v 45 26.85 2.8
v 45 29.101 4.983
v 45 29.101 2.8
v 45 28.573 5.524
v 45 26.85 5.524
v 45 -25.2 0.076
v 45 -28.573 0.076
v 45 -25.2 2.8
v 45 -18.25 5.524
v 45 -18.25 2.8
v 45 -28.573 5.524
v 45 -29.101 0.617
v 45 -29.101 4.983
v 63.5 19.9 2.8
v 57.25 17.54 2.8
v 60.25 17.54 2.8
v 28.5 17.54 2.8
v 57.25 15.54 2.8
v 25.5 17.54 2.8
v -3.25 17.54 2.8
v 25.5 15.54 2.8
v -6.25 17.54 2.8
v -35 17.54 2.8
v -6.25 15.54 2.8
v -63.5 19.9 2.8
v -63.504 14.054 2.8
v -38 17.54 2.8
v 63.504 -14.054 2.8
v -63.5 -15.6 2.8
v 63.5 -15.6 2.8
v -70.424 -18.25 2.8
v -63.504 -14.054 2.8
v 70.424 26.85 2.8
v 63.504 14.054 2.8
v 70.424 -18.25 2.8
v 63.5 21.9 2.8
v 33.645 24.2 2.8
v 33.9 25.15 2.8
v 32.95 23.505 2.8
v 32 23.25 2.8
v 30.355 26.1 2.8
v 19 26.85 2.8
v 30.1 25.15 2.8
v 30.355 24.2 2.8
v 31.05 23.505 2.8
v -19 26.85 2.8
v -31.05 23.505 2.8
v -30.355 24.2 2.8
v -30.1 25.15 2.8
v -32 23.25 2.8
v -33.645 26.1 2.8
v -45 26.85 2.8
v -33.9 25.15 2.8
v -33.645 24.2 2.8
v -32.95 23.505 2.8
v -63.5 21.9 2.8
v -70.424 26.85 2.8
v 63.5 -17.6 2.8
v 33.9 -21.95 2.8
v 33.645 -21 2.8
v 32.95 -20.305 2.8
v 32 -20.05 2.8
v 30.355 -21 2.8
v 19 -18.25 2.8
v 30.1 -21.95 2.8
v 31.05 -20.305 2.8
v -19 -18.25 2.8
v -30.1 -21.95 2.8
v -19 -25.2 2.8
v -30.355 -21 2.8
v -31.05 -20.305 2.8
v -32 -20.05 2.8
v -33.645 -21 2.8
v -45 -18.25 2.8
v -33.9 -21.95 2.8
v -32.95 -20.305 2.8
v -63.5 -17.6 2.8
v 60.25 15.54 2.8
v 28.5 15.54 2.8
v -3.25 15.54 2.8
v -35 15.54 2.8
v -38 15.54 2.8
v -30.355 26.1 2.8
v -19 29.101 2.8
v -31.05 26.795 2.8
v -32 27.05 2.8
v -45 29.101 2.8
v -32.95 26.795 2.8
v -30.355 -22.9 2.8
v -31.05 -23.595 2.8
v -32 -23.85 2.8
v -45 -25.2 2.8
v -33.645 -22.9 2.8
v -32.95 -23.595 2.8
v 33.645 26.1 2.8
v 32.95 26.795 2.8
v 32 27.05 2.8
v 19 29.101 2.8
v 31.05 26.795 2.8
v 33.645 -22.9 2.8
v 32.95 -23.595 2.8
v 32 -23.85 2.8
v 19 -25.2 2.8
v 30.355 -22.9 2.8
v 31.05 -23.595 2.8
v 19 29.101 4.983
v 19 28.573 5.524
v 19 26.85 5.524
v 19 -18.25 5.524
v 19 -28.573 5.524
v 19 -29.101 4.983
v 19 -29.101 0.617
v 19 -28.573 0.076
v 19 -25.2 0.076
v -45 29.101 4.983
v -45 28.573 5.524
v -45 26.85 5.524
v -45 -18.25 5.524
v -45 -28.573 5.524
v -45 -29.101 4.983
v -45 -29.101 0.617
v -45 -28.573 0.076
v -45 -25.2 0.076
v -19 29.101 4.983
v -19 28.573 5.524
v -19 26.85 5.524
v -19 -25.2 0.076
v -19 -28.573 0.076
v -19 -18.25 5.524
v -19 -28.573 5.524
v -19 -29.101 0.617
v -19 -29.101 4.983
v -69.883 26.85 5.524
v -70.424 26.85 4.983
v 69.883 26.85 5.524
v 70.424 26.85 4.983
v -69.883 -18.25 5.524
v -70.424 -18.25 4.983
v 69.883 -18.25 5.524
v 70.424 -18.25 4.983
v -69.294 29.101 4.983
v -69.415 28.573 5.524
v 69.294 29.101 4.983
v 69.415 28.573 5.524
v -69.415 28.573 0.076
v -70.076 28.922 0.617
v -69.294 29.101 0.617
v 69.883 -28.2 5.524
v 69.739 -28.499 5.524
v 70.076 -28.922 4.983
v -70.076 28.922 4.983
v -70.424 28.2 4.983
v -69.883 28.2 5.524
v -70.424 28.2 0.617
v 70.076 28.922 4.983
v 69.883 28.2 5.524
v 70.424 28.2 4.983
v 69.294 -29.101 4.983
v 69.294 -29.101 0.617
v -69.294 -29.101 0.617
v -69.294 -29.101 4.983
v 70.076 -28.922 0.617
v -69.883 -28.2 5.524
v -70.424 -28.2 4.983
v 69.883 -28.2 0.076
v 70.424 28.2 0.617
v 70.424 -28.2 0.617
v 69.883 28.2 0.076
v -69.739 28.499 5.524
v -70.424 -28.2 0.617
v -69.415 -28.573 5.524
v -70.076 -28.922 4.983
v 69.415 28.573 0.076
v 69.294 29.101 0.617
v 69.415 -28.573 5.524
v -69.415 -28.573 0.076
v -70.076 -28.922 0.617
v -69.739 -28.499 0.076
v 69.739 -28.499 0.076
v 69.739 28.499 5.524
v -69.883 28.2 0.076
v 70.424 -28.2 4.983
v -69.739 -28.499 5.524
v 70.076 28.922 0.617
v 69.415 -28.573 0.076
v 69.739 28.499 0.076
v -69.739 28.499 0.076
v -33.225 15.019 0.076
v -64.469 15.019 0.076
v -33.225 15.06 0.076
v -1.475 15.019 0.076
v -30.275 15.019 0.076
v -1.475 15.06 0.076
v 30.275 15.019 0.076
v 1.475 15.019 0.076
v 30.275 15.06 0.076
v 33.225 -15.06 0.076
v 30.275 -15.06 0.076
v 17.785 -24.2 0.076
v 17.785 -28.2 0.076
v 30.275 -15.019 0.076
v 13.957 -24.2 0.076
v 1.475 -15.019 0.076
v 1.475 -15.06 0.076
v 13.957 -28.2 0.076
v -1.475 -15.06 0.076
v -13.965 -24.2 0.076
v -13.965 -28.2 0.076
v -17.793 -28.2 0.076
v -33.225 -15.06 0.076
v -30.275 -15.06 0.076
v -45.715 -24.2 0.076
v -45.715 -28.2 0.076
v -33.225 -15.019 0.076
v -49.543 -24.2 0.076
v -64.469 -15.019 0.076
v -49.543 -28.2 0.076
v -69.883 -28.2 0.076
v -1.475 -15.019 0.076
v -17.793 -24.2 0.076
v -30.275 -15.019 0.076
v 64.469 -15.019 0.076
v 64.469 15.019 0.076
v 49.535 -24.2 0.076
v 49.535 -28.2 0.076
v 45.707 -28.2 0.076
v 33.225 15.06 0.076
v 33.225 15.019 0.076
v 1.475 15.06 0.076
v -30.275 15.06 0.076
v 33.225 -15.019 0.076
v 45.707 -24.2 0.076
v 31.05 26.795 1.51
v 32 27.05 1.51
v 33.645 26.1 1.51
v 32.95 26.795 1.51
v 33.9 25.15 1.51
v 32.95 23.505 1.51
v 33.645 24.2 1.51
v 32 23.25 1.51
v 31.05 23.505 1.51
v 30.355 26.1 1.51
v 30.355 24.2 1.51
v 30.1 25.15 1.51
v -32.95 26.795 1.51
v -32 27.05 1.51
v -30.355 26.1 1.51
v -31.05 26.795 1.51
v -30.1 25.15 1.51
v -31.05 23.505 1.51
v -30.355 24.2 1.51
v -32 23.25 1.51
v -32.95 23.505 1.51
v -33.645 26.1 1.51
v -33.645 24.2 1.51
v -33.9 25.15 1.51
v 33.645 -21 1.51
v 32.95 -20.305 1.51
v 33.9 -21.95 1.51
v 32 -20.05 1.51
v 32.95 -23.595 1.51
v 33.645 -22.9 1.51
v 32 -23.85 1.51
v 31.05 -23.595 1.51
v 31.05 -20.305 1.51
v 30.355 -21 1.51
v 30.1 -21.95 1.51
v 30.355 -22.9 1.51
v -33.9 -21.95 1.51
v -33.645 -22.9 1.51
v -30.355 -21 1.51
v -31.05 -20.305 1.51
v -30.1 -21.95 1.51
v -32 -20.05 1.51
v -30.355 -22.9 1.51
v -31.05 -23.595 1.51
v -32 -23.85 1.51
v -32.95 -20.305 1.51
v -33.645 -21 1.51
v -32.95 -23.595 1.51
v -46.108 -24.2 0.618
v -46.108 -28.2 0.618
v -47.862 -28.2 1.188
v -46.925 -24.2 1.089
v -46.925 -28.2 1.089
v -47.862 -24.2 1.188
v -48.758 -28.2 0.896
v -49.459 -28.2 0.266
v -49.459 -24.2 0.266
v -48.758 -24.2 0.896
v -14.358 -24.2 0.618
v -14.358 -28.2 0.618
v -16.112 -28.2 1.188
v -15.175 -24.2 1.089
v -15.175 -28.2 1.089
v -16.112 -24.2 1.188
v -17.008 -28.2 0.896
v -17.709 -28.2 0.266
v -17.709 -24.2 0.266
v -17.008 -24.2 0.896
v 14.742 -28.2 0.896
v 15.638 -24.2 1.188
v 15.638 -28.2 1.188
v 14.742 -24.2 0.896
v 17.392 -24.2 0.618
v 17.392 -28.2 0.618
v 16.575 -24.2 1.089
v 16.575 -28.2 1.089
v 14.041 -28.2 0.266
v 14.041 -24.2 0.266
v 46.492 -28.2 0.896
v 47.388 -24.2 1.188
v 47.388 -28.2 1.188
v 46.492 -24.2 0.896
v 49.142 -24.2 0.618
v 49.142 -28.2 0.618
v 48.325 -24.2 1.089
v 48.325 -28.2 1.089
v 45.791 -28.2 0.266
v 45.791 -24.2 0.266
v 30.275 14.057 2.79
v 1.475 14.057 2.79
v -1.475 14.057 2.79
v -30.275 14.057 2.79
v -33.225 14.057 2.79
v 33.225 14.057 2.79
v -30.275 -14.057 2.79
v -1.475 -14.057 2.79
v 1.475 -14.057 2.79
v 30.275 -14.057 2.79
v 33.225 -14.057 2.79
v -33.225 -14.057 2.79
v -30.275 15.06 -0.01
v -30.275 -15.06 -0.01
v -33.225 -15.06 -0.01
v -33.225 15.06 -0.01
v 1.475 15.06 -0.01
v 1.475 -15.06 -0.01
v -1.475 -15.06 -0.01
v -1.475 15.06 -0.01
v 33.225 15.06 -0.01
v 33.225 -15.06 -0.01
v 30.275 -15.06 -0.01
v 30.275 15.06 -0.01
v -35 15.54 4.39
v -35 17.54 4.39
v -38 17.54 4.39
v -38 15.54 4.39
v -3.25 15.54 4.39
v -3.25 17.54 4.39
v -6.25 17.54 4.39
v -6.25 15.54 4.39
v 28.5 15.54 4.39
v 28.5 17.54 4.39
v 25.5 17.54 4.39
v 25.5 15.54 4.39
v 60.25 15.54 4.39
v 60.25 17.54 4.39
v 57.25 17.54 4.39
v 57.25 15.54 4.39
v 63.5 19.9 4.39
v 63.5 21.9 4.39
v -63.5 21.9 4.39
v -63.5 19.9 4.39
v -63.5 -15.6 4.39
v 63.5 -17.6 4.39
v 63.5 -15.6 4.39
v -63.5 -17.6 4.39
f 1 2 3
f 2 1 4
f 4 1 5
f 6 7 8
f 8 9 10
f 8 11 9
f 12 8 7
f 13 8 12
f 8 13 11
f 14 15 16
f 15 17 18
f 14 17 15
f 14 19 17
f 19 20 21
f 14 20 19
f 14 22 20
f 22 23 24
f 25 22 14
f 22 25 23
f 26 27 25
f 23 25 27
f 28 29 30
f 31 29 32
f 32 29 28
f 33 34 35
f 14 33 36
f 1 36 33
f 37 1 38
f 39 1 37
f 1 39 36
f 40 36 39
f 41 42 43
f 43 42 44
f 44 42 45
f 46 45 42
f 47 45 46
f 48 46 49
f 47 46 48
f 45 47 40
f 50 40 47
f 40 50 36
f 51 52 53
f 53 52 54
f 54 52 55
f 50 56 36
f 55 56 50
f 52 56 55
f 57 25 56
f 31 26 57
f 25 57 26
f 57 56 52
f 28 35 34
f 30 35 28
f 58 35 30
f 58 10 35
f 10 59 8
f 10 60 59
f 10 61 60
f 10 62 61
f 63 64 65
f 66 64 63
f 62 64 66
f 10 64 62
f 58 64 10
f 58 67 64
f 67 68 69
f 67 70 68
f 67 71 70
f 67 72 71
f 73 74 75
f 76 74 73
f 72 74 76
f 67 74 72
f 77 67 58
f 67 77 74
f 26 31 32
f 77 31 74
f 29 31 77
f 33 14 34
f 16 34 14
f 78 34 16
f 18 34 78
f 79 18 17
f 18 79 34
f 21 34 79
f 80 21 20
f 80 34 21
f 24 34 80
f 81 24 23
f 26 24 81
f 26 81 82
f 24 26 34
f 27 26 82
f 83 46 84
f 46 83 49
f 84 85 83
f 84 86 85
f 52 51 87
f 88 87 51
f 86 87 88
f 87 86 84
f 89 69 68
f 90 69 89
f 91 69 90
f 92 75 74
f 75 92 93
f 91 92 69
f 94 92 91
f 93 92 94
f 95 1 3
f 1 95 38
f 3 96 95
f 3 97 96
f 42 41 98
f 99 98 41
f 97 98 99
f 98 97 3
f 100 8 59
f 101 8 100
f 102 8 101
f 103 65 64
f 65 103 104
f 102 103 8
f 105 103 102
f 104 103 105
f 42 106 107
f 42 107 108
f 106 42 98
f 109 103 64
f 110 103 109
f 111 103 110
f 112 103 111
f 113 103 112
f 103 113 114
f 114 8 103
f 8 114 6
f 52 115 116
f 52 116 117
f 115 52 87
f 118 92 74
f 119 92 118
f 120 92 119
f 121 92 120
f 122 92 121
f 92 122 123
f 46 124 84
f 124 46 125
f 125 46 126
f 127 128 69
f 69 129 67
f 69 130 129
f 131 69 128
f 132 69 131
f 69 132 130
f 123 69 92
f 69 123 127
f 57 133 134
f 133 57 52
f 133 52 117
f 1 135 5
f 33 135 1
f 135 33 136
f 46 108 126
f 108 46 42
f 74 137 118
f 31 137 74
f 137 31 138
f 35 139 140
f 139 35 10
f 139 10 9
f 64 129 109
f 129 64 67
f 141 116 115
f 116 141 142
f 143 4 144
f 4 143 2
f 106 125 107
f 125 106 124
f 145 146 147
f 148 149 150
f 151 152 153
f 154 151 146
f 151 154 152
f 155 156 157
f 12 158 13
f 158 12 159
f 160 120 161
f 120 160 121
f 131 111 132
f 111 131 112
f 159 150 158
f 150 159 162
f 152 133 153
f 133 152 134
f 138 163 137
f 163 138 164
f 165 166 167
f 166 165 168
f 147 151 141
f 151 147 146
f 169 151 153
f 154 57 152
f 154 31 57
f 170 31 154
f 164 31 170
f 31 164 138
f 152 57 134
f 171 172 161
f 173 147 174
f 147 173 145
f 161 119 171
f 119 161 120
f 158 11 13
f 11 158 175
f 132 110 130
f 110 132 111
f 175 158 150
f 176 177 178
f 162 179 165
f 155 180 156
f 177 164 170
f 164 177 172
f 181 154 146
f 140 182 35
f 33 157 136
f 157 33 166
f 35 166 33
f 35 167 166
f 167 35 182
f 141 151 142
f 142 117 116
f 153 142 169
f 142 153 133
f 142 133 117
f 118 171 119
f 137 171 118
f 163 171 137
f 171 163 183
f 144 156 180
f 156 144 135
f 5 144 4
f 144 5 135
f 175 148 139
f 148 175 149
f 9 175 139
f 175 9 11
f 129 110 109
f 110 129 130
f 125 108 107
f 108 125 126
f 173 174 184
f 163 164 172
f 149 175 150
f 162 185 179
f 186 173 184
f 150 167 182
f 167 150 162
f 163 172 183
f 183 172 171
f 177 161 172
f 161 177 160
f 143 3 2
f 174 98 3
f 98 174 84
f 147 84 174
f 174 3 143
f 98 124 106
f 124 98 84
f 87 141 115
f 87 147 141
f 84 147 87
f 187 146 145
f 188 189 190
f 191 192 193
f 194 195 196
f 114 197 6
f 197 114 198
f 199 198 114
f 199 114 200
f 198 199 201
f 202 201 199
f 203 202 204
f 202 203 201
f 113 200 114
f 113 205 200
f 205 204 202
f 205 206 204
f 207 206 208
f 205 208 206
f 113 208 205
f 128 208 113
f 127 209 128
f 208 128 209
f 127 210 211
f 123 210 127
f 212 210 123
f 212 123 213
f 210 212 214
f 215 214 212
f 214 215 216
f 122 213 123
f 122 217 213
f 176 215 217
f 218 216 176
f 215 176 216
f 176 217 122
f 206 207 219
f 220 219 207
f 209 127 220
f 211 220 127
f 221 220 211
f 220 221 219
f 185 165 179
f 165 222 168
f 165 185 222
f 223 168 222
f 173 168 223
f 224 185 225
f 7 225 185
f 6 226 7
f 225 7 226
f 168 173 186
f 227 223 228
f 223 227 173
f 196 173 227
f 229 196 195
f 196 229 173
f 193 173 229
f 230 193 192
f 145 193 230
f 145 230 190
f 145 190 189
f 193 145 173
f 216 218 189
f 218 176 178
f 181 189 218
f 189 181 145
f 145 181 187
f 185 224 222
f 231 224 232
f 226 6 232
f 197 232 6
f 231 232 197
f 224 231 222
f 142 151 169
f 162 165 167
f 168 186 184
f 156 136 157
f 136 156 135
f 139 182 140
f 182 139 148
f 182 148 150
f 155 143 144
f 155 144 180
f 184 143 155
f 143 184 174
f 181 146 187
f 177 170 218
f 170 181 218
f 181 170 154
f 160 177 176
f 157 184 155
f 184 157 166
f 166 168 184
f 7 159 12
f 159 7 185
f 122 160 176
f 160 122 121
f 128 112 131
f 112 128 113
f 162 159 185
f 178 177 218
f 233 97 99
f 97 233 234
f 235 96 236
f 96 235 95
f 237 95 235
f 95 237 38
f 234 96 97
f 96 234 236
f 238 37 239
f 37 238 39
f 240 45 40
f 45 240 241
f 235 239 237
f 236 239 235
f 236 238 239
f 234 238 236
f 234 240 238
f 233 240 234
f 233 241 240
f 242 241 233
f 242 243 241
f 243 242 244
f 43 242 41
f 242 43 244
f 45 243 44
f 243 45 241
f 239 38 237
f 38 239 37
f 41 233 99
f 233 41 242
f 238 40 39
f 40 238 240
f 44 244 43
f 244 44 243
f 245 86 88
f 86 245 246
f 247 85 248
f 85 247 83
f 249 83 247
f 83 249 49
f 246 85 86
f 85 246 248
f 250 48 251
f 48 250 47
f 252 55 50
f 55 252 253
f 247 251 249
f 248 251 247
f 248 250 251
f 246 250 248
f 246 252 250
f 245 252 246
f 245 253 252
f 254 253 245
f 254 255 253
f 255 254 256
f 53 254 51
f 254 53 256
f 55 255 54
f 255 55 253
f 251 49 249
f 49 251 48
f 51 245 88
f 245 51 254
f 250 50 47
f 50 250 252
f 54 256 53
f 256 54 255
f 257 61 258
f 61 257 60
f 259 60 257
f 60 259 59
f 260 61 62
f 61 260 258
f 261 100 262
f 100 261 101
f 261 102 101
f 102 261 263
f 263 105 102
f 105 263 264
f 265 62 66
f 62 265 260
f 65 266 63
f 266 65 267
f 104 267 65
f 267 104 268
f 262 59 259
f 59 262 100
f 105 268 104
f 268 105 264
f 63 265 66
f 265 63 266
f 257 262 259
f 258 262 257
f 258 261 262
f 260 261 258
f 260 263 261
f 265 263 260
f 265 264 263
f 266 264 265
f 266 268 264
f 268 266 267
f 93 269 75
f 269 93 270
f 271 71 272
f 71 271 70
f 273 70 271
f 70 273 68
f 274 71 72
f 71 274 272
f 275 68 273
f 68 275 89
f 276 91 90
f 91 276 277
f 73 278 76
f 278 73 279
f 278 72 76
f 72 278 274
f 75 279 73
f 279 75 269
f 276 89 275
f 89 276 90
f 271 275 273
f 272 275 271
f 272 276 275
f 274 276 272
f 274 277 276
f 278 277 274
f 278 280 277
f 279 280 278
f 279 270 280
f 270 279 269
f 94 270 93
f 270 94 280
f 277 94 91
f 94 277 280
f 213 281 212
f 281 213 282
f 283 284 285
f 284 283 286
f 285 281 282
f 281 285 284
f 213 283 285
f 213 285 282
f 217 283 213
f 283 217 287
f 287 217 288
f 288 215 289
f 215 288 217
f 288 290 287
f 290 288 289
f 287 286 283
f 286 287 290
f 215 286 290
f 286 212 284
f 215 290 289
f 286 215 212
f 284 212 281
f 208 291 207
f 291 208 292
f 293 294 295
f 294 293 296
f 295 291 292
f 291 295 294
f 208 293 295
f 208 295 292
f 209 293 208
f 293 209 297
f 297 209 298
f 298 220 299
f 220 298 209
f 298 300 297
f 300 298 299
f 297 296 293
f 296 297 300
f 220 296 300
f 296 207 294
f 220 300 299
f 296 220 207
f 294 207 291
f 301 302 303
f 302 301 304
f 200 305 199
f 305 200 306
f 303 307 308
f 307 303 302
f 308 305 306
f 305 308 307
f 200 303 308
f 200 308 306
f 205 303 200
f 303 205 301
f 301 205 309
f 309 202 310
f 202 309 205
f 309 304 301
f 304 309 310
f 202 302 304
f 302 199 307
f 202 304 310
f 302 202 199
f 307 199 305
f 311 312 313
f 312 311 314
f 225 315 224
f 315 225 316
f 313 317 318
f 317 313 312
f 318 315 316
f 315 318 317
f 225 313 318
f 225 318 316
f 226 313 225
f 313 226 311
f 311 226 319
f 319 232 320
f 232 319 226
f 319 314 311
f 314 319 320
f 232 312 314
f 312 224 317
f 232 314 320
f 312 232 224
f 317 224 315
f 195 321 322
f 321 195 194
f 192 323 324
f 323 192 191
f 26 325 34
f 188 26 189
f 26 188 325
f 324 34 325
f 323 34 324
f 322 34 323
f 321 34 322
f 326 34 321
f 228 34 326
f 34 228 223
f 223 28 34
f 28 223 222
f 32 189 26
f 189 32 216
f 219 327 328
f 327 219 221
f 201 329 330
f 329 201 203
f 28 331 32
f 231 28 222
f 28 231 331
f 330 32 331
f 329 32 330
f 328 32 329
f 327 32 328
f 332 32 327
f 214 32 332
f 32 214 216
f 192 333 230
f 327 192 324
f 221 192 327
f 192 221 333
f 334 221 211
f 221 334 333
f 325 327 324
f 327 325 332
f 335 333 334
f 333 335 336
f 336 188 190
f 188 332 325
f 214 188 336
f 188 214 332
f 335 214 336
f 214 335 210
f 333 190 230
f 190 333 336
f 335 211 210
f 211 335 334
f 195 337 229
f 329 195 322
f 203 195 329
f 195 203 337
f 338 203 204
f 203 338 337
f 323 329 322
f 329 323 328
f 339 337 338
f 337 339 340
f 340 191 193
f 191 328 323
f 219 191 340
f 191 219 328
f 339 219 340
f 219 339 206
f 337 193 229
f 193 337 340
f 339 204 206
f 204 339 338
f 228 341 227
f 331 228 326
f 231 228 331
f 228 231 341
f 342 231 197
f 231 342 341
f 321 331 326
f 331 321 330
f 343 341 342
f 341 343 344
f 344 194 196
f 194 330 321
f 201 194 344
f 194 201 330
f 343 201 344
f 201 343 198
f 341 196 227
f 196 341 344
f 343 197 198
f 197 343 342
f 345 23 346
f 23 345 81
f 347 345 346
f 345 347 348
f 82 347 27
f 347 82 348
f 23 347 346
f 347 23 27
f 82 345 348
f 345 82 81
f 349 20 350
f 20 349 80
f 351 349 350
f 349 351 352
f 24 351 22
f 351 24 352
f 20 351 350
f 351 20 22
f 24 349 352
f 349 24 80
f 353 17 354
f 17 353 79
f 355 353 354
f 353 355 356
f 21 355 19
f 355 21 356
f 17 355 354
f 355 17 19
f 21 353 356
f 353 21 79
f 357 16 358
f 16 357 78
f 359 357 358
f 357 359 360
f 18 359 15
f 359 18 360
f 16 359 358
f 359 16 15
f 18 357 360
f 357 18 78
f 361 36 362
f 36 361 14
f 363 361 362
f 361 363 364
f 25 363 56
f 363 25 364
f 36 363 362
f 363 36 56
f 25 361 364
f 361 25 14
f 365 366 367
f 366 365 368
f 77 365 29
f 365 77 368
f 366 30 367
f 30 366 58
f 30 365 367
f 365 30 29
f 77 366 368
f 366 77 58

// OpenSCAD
// -*- mode: SCAD ; c-file-style: "ellemtel" ; coding: utf-8 -*-
//
// Holder to scan Minox film strips with a Reflecta ProScan 10T
//
// © 2018 Roland Sieker <ospalh@gmail.com>
// Licence: CC-BY-SA 4.0


/* [Global] */


// … to preview. You will get both parts when you click “Create Thing”.
part = "halter"; // [halter: film holder, einsatz: film holder clamp]

// Set this to “render” and click on “Create Thing” when done with the setup.
preview = 1; // [0:render, 1:preview]

/* [Holder] */

// Width of the holder. This one and the next one are the two values you do need to set up for your scanner. Preset is for a Reflecta proScan. Maybe subtract half a millimtre for a better fit.
holder_width = 58.4;  // [20:0.1:150]

// Height or thickness of the holder. See above. You know they were too high when you need a mallet to go from one image to the next…
holder_thickness = 5.6;  // [3:0.1:10]

// How many exposures on the longest strips you want to fit into this. Make sure the resulting holder still fits onto your print bed.
images_per_strip = 4;  // [1:1:8]

// Different manufacturers’ scanner place their little catches to position the holder at different sides.
position_notch_side = 90;  // [90: bottom, 0: side]

/* [Magnets] */

// Diameter of the magnet hole. Add clearance by hand here. Set to 0 for no magnet holes.
magnet_diameter = 3.8;  // [0:0.1:15]
// Height or thickness of the magnet. Make sure to use magnets flat enough to fit.
magnet_height = 1;  // [0.5:0.1:3]

/* [Hidden] */

// Das ganze Filmgrößen-Geraffel wieder verstecken: ein thing pro
// Film. Teil der Automatik (mit/ohne Stege, Lang-oder Kurzkerbe) sind so
// halbwegs inaktiv.


// Width of the film
film_width = 35;  // [8:0.1:70]
// Length from the left edge of an exposure to its right edge
image_width = 28.8; // [8:0.1:100]
image_pitch = 127/4;  // Ein Viererstreifen ist genau 127 mm lang. Das ist
// irgendwie was rundes in Zöllen. Das muss mich nicht scheren.

// Size of an exposure from bottom to top.
image_height = 28.1; // Hat sich was, »quadratishc«. Nachmessen hat ergeben, dass die Bilder etwas breiter als hoch sind.
rand_unten = 5.6;  // Könnten 7/32 Zoll sein. What TF ever. Ich könnte 118 Schweizerfranken bezahlen und es im Standard nachlesen. Oder das Geld sparen
rand_oben = film_width - image_height - rand_unten;
echo("rand_oben", rand_oben);

bildabstand = max(image_pitch, image_width);
l_filmsteg = max(0, bildabstand-image_width);
r_r = 1.0;  // Rundungsradius

// Auch wichtig:
l_zk = 4;  // Länge Zentrierkerbe
b_zk = 4;  // Breite Zentrierkerbe
h_zk = 1.2;  // Tiefe der Zentrierkerbe
w_zk = 1;  // Wand bzw Abstand der Zentrierkerbe vom Rand



l_griff = 25;
o_griff = 26;
w_griff = 2;


w_schraeg = 1;  // Breite der Abschrägung rund um die Filmfenster

kurzsteg_grenze = w_schraeg;  // Weniger als 1 mm pro Seite: Kurzstege

mit_langsteg_oben = ( rand_oben >= kurzsteg_grenze);
mit_langsteg_unten = ( rand_unten >= kurzsteg_grenze);


w_steg = 2;  // Breite für Stücke, die den Film zentrieren.
l_kurzsteg = 0.4*bildabstand;  // Länge für Stücke, die den Film zentrieren,
// wenn wir keine Fensterstege machen


magnet_off_oben = -2;
magnet_off_unten = 1.2;

w_filmloch = 2.5; // Ein zehntel Zoll?
l_filmloch = 3.5; // ca. 35/254 Zoll.
// dy_fl_bl = 1.25; // Abstand Filmloch oben zum Blidbereich
dy_fl_k = 1.86;  // Abstand Filmloch unten zur Filmkante
dx_fl_sm = 3;  // Abstand Filmloch links zur Mitte des Stegs

// *******************************************************
// Extra parameters. These can be changed reasonably safely.


w = 1.8;  // Wall width
p = 1.2;  // Bottom, top plate height
c = 0.5;  // Clearance
c_z = 0.3;  // Clearance in z direction. Mostly for the magnet hole and centering ridge
angle = 60; // Overhangs much below 60° are a problem for me


// Halbwegs wichtig
h_steg = 1.6;  // Höhe für Stücke, die den Film zentrieren.
h_nut = h_steg + c_z;  // Tiefe für Stücke, auf denen der Film nicht aufliegt



// *******************************************************
// Some shortcuts. These shouldn’t be changed

tau = 2 * PI;  // π is still wrong. τ = ⌀ ÷ r

xy_factor = 1/tan(angle);
// To get from a height to a horizontal width inclined correctly
z_factor = tan(angle);  // The other way around

some_distance = 1.2 * holder_width;
ms = 0.01;  // Muggeseggele.

// fn for differently sized objects and fs, fa; all for preview or rendering.
pna = 40;
pnb = 15;
pa = 5;
ps = 1;
rna = 180;
rnb = 30;
ra = 1;
rs = 0.1;
function na() = (preview) ? pna : rna;
function nb() = (preview) ? pnb : rnb;
$fs = (preview) ? ps : rs;
$fa = (preview) ? pa : ra;

l_fenster = bildabstand * images_per_strip;
l_rand = 2 * w_steg + w_schraeg + 2;
w_rand = w_schraeg + 7;
l_ue_a =  l_fenster + 2*l_rand;
w_einsatz = image_height + 2 * w_rand;
h_bd = holder_thickness/2;  // Höhe Boden oder Deckel

to_griff = l_ue_a/2 - o_griff - l_griff/2;



// *******************************************************
// End setup




// *******************************************************
// Generate the parts


print_part();
// filmhalter();
// einsatz();
// preview_parts();
// stack_parts();



module print_part()
{
   if ("halter" == part)
   {
      filmhalter();
   }
   if ("einsatz" == part)
   {
      einsatz();
   }
}

module preview_parts()
{
   filmhalter();
   translate([0, some_distance, 0])
   {
      einsatz();
   }
}

module stack_parts()
{
   // intersection()
   {
       // color("yellow")
      {
         filmhalter();
      }
      translate([0,0,holder_thickness + ms])
      {
         rotate([0,180,0])
         {
            // color("red")
            {
               einsatz();
            }
         }
      }
   }
}

// *******************************************************
// Code for the parts themselves


module filmhalter()
{
   difference()
   {
      basis_filmhalter();
      fenster();
      magnetausschnitte();
      kerben(false);
   }
   fensterstege();
   bodenstege();
}

module einsatz()
{
   difference()
   {
      union()
      {
         difference()
         {
            basis_einsatz();
            fenster();
         }
         fensterstege();
      }
      einsatzausschnitte();
      // magnetausschnitte(magnet_diameter/2);
      magnetausschnitte();
      kerben(true);
   }

}


module basis_filmhalter()
{
   translate([0,0,h_bd])
   {
      difference()
      {
         massiver_halter();
         einsatz_ausschnitt(2*c);
      }
   }
}


module basis_einsatz()
{
   translate([0,0,h_bd])
   {
      intersection()
      {
         massiver_halter();
         rotate([0,180,0])
         {
            einsatz_ausschnitt(0);
         }
      }
   }

}

module massiver_halter()
{
   hull()
   {
      vosp();
      mirror([0,0,1])
      {
         vosp();
      }
   }

   module vosp()
   {
      tosp();
      mirror([0,1,0])
      {
         tosp();
      }
   }
   module tosp()
   {
      osp();
      mirror([1,0,0])
      {
         osp();
      }

   }

   module osp()
   {
      translate([l_ue_a/2-r_r, holder_width/2-r_r, holder_thickness/2-r_r])
      {
         sphere(r=r_r);
      }
   }
}


module einsatz_ausschnitt(ec)
{
   translate([0, 0, holder_thickness])
   {
      translate([0, rand_unten - rand_oben, 0])
      cube([l_ue_a+2*ms, w_einsatz + ec, 2*holder_thickness], center=true);
      grip_cut();
      mirror()
      {
         grip_cut();
      }
   }
   module grip_cut()
   {
      translate([to_griff, 0, 0])
      {
         cube([l_griff + ec, holder_width + 2*ms, 2*holder_thickness], center=true);
         translate([0, -holder_width/2, 0])
         {
            cube([l_griff + ec, 2*w_griff+4*ec, 4*holder_thickness], center=true);
         }
      }
   }
}

module fenster()
{
   translate([0, 0, h_bd])
   {
      hull()
      {
         translate([0,0,-0.5+ms])
         {
            cube([l_fenster, image_height, 1], center=true);
         }
         translate([0,0,-h_bd-0.5-ms])
         {
            cube(
               [l_fenster+2*w_schraeg, image_height+2*w_schraeg, 1], center=true);
         }
      }

   }
}


module magnetausschnitte()
{
   if (magnet_diameter > 0 && magnet_height > 0)
   {
      yo_mag = w_einsatz/2 + magnet_diameter/2;
      magnetausschnitt(to_griff, yo_mag + magnet_off_unten);
      magnetausschnitt(-to_griff, yo_mag + magnet_off_unten);
      magnetausschnitt(to_griff, -yo_mag - magnet_off_oben);
      magnetausschnitt(-to_griff, -yo_mag - magnet_off_oben);
   }
}

module magnetausschnitt(exo, eyo)
{


   // Mittig in den Griffen.
   translate(
      [exo, eyo, h_bd - magnet_height-c_z + ms])
   {
      cylinder(d=magnet_diameter, h=magnet_height+c_z);
      // N.B. Spiel ist schon im magnet_diameter eingerechnet
   }
}

module bodenstege()
{
   translate([0, 0, -ms+h_steg/2+h_bd])
   {
      if (mit_langsteg_unten)
      {
         langbodensteg(rand_unten);
      }
      else
      {
         kurzbodenstege(rand_unten);
      }
      if (mit_langsteg_oben)
      {
         rotate(180)
         {
            langbodensteg(rand_oben);
         }
      }
      else
      {
         rotate(180)
         {
            kurzbodenstege(rand_oben);
         }
      }
      zentriernasen();
   }
   module langbodensteg(eo)
   {
      translate([0,w_steg/2+image_height/2+c/2+eo, 0])
      {
         cube([l_fenster, w_steg, h_steg], center=true);
      }
   }
   module kurzbodenstege(eo)
   {
      for (i=[0:images_per_strip-1])
      {
         translate([-l_fenster/2 + (0.5 + i) * bildabstand, w_steg/2+image_height/2+eo+c/2, 0])
         {
            cube([l_kurzsteg, w_steg, h_steg], center=true);
         }
      }
   }
   module zentriernasen()
   {
      for (i=[1:images_per_strip])
      {
         // Irgendwie ist »oben« und »unten« verkehrt. Für Teile unten braucht mensch positive y-Werte.
         translate(
            [-l_fenster/2 + i * bildabstand-l_filmloch+c/2-dx_fl_sm,
             +image_height/2 + rand_unten - w_filmloch -dy_fl_k+ c/2 , -h_steg/2])
         {
            cube([l_filmloch-c, w_filmloch-c, h_steg]);
         }
      }
   }
}

module einsatzausschnitte()
{
   translate([0, 0, h_bd + ms-h_nut/2])
   {
      if (mit_langsteg_unten)
      {
         langausschnitt(rand_unten);
      }
      else
      {
         kurzausschnitte(rand_unten);
      }
      if (mit_langsteg_oben)
      {
         rotate(180)
         {
            langausschnitt(rand_oben);
         }
      }
      else
      {
         rotate(180)
         {
            kurzausschnitte(rand_oben);
         }
      }
      zentrierausschnitte();
   }
   module langausschnitt(eyo)
   {
      translate([0,w_steg/2+image_height/2+eyo+c/2,0])
      {
         cube([l_fenster+6*c, w_steg+2*c, h_nut], center=true);
      }
   }
   module kurzausschnitte(eyo)
   {
      for (i=[0:images_per_strip-1])
      {
         translate(
            [-l_fenster/2 + (0.5 + i) * bildabstand,
             w_steg/2+image_height/2+eyo+c/2-film_width/4 + image_height/4, 0])
         {
            cube(
               [l_kurzsteg+2*c, w_steg+2*c+film_width/2 - image_height/2,
                h_nut], center=true);
         }
      }
   }
      module zentrierausschnitte()
   {
      for (i=[0:images_per_strip-1])
      {
         translate(
            [-l_fenster/2 + i * bildabstand-c/2+dx_fl_sm,
             +image_height/2 + rand_unten - w_filmloch -dy_fl_k- c/2 , -h_nut/2])
         {
            cube([l_filmloch+c, w_filmloch+c, h_nut]);
         }
      }
   }
}


module fensterstege()
{
   if (l_filmsteg > 0)
   {
      for (i=[1:images_per_strip-1])
      {
         translate([-l_fenster/2 + i * bildabstand, 0, h_bd/2-ms])
         {
            cube([l_filmsteg, image_height+2*w_schraeg + 2*ms ,h_bd], center=true);
         }
      }
   }
}

module kerben(oben)
{
   // Den Radius der Zentrierkerbe kann mensch per Pythagoras bestimmen.
   // Hypothenuse = r_zk
   // 1. Kathete = l_zk/2
   // 2. Kathete = r_zk - h_zk
   // h_zk > 0
   // r_zk * r_zk = l_zk * l_zk / 4 + r_zk * r_zk - 2 * r_zk * h_zk + h_zk * h_zk
   // 0 = l_zk * l_zk / 4 - 2 * r_zk * h_zk + h_zk * h_zk
   // 2 * r_zk * h_zk =
   r_zk = (l_zk * l_zk / 4 + h_zk * h_zk) / (2 * h_zk);
   // Die Variable heißt »position_notch_side«, und enthält einen Winkel. Funktioniert.
   dz_zk = (position_notch_side > 0) ?
      ( (oben) ? holder_thickness - h_zk + r_zk : h_zk-r_zk) :
      -ms;
   ahzk = (position_notch_side > 0) ? b_zk : holder_thickness + 2*ms;
   hk_yo = (position_notch_side > 0) ? -w_zk - b_zk : r_zk -h_zk;
   for (i=[0:images_per_strip-1])
   {
      translate(
         [-l_fenster/2 + i * bildabstand + bildabstand/2, -holder_width/2 -hk_yo, dz_zk])
      {
         rotate([position_notch_side,0,0])
         {
            cylinder(r=r_zk, h=ahzk);
         }
      }
   }

}
